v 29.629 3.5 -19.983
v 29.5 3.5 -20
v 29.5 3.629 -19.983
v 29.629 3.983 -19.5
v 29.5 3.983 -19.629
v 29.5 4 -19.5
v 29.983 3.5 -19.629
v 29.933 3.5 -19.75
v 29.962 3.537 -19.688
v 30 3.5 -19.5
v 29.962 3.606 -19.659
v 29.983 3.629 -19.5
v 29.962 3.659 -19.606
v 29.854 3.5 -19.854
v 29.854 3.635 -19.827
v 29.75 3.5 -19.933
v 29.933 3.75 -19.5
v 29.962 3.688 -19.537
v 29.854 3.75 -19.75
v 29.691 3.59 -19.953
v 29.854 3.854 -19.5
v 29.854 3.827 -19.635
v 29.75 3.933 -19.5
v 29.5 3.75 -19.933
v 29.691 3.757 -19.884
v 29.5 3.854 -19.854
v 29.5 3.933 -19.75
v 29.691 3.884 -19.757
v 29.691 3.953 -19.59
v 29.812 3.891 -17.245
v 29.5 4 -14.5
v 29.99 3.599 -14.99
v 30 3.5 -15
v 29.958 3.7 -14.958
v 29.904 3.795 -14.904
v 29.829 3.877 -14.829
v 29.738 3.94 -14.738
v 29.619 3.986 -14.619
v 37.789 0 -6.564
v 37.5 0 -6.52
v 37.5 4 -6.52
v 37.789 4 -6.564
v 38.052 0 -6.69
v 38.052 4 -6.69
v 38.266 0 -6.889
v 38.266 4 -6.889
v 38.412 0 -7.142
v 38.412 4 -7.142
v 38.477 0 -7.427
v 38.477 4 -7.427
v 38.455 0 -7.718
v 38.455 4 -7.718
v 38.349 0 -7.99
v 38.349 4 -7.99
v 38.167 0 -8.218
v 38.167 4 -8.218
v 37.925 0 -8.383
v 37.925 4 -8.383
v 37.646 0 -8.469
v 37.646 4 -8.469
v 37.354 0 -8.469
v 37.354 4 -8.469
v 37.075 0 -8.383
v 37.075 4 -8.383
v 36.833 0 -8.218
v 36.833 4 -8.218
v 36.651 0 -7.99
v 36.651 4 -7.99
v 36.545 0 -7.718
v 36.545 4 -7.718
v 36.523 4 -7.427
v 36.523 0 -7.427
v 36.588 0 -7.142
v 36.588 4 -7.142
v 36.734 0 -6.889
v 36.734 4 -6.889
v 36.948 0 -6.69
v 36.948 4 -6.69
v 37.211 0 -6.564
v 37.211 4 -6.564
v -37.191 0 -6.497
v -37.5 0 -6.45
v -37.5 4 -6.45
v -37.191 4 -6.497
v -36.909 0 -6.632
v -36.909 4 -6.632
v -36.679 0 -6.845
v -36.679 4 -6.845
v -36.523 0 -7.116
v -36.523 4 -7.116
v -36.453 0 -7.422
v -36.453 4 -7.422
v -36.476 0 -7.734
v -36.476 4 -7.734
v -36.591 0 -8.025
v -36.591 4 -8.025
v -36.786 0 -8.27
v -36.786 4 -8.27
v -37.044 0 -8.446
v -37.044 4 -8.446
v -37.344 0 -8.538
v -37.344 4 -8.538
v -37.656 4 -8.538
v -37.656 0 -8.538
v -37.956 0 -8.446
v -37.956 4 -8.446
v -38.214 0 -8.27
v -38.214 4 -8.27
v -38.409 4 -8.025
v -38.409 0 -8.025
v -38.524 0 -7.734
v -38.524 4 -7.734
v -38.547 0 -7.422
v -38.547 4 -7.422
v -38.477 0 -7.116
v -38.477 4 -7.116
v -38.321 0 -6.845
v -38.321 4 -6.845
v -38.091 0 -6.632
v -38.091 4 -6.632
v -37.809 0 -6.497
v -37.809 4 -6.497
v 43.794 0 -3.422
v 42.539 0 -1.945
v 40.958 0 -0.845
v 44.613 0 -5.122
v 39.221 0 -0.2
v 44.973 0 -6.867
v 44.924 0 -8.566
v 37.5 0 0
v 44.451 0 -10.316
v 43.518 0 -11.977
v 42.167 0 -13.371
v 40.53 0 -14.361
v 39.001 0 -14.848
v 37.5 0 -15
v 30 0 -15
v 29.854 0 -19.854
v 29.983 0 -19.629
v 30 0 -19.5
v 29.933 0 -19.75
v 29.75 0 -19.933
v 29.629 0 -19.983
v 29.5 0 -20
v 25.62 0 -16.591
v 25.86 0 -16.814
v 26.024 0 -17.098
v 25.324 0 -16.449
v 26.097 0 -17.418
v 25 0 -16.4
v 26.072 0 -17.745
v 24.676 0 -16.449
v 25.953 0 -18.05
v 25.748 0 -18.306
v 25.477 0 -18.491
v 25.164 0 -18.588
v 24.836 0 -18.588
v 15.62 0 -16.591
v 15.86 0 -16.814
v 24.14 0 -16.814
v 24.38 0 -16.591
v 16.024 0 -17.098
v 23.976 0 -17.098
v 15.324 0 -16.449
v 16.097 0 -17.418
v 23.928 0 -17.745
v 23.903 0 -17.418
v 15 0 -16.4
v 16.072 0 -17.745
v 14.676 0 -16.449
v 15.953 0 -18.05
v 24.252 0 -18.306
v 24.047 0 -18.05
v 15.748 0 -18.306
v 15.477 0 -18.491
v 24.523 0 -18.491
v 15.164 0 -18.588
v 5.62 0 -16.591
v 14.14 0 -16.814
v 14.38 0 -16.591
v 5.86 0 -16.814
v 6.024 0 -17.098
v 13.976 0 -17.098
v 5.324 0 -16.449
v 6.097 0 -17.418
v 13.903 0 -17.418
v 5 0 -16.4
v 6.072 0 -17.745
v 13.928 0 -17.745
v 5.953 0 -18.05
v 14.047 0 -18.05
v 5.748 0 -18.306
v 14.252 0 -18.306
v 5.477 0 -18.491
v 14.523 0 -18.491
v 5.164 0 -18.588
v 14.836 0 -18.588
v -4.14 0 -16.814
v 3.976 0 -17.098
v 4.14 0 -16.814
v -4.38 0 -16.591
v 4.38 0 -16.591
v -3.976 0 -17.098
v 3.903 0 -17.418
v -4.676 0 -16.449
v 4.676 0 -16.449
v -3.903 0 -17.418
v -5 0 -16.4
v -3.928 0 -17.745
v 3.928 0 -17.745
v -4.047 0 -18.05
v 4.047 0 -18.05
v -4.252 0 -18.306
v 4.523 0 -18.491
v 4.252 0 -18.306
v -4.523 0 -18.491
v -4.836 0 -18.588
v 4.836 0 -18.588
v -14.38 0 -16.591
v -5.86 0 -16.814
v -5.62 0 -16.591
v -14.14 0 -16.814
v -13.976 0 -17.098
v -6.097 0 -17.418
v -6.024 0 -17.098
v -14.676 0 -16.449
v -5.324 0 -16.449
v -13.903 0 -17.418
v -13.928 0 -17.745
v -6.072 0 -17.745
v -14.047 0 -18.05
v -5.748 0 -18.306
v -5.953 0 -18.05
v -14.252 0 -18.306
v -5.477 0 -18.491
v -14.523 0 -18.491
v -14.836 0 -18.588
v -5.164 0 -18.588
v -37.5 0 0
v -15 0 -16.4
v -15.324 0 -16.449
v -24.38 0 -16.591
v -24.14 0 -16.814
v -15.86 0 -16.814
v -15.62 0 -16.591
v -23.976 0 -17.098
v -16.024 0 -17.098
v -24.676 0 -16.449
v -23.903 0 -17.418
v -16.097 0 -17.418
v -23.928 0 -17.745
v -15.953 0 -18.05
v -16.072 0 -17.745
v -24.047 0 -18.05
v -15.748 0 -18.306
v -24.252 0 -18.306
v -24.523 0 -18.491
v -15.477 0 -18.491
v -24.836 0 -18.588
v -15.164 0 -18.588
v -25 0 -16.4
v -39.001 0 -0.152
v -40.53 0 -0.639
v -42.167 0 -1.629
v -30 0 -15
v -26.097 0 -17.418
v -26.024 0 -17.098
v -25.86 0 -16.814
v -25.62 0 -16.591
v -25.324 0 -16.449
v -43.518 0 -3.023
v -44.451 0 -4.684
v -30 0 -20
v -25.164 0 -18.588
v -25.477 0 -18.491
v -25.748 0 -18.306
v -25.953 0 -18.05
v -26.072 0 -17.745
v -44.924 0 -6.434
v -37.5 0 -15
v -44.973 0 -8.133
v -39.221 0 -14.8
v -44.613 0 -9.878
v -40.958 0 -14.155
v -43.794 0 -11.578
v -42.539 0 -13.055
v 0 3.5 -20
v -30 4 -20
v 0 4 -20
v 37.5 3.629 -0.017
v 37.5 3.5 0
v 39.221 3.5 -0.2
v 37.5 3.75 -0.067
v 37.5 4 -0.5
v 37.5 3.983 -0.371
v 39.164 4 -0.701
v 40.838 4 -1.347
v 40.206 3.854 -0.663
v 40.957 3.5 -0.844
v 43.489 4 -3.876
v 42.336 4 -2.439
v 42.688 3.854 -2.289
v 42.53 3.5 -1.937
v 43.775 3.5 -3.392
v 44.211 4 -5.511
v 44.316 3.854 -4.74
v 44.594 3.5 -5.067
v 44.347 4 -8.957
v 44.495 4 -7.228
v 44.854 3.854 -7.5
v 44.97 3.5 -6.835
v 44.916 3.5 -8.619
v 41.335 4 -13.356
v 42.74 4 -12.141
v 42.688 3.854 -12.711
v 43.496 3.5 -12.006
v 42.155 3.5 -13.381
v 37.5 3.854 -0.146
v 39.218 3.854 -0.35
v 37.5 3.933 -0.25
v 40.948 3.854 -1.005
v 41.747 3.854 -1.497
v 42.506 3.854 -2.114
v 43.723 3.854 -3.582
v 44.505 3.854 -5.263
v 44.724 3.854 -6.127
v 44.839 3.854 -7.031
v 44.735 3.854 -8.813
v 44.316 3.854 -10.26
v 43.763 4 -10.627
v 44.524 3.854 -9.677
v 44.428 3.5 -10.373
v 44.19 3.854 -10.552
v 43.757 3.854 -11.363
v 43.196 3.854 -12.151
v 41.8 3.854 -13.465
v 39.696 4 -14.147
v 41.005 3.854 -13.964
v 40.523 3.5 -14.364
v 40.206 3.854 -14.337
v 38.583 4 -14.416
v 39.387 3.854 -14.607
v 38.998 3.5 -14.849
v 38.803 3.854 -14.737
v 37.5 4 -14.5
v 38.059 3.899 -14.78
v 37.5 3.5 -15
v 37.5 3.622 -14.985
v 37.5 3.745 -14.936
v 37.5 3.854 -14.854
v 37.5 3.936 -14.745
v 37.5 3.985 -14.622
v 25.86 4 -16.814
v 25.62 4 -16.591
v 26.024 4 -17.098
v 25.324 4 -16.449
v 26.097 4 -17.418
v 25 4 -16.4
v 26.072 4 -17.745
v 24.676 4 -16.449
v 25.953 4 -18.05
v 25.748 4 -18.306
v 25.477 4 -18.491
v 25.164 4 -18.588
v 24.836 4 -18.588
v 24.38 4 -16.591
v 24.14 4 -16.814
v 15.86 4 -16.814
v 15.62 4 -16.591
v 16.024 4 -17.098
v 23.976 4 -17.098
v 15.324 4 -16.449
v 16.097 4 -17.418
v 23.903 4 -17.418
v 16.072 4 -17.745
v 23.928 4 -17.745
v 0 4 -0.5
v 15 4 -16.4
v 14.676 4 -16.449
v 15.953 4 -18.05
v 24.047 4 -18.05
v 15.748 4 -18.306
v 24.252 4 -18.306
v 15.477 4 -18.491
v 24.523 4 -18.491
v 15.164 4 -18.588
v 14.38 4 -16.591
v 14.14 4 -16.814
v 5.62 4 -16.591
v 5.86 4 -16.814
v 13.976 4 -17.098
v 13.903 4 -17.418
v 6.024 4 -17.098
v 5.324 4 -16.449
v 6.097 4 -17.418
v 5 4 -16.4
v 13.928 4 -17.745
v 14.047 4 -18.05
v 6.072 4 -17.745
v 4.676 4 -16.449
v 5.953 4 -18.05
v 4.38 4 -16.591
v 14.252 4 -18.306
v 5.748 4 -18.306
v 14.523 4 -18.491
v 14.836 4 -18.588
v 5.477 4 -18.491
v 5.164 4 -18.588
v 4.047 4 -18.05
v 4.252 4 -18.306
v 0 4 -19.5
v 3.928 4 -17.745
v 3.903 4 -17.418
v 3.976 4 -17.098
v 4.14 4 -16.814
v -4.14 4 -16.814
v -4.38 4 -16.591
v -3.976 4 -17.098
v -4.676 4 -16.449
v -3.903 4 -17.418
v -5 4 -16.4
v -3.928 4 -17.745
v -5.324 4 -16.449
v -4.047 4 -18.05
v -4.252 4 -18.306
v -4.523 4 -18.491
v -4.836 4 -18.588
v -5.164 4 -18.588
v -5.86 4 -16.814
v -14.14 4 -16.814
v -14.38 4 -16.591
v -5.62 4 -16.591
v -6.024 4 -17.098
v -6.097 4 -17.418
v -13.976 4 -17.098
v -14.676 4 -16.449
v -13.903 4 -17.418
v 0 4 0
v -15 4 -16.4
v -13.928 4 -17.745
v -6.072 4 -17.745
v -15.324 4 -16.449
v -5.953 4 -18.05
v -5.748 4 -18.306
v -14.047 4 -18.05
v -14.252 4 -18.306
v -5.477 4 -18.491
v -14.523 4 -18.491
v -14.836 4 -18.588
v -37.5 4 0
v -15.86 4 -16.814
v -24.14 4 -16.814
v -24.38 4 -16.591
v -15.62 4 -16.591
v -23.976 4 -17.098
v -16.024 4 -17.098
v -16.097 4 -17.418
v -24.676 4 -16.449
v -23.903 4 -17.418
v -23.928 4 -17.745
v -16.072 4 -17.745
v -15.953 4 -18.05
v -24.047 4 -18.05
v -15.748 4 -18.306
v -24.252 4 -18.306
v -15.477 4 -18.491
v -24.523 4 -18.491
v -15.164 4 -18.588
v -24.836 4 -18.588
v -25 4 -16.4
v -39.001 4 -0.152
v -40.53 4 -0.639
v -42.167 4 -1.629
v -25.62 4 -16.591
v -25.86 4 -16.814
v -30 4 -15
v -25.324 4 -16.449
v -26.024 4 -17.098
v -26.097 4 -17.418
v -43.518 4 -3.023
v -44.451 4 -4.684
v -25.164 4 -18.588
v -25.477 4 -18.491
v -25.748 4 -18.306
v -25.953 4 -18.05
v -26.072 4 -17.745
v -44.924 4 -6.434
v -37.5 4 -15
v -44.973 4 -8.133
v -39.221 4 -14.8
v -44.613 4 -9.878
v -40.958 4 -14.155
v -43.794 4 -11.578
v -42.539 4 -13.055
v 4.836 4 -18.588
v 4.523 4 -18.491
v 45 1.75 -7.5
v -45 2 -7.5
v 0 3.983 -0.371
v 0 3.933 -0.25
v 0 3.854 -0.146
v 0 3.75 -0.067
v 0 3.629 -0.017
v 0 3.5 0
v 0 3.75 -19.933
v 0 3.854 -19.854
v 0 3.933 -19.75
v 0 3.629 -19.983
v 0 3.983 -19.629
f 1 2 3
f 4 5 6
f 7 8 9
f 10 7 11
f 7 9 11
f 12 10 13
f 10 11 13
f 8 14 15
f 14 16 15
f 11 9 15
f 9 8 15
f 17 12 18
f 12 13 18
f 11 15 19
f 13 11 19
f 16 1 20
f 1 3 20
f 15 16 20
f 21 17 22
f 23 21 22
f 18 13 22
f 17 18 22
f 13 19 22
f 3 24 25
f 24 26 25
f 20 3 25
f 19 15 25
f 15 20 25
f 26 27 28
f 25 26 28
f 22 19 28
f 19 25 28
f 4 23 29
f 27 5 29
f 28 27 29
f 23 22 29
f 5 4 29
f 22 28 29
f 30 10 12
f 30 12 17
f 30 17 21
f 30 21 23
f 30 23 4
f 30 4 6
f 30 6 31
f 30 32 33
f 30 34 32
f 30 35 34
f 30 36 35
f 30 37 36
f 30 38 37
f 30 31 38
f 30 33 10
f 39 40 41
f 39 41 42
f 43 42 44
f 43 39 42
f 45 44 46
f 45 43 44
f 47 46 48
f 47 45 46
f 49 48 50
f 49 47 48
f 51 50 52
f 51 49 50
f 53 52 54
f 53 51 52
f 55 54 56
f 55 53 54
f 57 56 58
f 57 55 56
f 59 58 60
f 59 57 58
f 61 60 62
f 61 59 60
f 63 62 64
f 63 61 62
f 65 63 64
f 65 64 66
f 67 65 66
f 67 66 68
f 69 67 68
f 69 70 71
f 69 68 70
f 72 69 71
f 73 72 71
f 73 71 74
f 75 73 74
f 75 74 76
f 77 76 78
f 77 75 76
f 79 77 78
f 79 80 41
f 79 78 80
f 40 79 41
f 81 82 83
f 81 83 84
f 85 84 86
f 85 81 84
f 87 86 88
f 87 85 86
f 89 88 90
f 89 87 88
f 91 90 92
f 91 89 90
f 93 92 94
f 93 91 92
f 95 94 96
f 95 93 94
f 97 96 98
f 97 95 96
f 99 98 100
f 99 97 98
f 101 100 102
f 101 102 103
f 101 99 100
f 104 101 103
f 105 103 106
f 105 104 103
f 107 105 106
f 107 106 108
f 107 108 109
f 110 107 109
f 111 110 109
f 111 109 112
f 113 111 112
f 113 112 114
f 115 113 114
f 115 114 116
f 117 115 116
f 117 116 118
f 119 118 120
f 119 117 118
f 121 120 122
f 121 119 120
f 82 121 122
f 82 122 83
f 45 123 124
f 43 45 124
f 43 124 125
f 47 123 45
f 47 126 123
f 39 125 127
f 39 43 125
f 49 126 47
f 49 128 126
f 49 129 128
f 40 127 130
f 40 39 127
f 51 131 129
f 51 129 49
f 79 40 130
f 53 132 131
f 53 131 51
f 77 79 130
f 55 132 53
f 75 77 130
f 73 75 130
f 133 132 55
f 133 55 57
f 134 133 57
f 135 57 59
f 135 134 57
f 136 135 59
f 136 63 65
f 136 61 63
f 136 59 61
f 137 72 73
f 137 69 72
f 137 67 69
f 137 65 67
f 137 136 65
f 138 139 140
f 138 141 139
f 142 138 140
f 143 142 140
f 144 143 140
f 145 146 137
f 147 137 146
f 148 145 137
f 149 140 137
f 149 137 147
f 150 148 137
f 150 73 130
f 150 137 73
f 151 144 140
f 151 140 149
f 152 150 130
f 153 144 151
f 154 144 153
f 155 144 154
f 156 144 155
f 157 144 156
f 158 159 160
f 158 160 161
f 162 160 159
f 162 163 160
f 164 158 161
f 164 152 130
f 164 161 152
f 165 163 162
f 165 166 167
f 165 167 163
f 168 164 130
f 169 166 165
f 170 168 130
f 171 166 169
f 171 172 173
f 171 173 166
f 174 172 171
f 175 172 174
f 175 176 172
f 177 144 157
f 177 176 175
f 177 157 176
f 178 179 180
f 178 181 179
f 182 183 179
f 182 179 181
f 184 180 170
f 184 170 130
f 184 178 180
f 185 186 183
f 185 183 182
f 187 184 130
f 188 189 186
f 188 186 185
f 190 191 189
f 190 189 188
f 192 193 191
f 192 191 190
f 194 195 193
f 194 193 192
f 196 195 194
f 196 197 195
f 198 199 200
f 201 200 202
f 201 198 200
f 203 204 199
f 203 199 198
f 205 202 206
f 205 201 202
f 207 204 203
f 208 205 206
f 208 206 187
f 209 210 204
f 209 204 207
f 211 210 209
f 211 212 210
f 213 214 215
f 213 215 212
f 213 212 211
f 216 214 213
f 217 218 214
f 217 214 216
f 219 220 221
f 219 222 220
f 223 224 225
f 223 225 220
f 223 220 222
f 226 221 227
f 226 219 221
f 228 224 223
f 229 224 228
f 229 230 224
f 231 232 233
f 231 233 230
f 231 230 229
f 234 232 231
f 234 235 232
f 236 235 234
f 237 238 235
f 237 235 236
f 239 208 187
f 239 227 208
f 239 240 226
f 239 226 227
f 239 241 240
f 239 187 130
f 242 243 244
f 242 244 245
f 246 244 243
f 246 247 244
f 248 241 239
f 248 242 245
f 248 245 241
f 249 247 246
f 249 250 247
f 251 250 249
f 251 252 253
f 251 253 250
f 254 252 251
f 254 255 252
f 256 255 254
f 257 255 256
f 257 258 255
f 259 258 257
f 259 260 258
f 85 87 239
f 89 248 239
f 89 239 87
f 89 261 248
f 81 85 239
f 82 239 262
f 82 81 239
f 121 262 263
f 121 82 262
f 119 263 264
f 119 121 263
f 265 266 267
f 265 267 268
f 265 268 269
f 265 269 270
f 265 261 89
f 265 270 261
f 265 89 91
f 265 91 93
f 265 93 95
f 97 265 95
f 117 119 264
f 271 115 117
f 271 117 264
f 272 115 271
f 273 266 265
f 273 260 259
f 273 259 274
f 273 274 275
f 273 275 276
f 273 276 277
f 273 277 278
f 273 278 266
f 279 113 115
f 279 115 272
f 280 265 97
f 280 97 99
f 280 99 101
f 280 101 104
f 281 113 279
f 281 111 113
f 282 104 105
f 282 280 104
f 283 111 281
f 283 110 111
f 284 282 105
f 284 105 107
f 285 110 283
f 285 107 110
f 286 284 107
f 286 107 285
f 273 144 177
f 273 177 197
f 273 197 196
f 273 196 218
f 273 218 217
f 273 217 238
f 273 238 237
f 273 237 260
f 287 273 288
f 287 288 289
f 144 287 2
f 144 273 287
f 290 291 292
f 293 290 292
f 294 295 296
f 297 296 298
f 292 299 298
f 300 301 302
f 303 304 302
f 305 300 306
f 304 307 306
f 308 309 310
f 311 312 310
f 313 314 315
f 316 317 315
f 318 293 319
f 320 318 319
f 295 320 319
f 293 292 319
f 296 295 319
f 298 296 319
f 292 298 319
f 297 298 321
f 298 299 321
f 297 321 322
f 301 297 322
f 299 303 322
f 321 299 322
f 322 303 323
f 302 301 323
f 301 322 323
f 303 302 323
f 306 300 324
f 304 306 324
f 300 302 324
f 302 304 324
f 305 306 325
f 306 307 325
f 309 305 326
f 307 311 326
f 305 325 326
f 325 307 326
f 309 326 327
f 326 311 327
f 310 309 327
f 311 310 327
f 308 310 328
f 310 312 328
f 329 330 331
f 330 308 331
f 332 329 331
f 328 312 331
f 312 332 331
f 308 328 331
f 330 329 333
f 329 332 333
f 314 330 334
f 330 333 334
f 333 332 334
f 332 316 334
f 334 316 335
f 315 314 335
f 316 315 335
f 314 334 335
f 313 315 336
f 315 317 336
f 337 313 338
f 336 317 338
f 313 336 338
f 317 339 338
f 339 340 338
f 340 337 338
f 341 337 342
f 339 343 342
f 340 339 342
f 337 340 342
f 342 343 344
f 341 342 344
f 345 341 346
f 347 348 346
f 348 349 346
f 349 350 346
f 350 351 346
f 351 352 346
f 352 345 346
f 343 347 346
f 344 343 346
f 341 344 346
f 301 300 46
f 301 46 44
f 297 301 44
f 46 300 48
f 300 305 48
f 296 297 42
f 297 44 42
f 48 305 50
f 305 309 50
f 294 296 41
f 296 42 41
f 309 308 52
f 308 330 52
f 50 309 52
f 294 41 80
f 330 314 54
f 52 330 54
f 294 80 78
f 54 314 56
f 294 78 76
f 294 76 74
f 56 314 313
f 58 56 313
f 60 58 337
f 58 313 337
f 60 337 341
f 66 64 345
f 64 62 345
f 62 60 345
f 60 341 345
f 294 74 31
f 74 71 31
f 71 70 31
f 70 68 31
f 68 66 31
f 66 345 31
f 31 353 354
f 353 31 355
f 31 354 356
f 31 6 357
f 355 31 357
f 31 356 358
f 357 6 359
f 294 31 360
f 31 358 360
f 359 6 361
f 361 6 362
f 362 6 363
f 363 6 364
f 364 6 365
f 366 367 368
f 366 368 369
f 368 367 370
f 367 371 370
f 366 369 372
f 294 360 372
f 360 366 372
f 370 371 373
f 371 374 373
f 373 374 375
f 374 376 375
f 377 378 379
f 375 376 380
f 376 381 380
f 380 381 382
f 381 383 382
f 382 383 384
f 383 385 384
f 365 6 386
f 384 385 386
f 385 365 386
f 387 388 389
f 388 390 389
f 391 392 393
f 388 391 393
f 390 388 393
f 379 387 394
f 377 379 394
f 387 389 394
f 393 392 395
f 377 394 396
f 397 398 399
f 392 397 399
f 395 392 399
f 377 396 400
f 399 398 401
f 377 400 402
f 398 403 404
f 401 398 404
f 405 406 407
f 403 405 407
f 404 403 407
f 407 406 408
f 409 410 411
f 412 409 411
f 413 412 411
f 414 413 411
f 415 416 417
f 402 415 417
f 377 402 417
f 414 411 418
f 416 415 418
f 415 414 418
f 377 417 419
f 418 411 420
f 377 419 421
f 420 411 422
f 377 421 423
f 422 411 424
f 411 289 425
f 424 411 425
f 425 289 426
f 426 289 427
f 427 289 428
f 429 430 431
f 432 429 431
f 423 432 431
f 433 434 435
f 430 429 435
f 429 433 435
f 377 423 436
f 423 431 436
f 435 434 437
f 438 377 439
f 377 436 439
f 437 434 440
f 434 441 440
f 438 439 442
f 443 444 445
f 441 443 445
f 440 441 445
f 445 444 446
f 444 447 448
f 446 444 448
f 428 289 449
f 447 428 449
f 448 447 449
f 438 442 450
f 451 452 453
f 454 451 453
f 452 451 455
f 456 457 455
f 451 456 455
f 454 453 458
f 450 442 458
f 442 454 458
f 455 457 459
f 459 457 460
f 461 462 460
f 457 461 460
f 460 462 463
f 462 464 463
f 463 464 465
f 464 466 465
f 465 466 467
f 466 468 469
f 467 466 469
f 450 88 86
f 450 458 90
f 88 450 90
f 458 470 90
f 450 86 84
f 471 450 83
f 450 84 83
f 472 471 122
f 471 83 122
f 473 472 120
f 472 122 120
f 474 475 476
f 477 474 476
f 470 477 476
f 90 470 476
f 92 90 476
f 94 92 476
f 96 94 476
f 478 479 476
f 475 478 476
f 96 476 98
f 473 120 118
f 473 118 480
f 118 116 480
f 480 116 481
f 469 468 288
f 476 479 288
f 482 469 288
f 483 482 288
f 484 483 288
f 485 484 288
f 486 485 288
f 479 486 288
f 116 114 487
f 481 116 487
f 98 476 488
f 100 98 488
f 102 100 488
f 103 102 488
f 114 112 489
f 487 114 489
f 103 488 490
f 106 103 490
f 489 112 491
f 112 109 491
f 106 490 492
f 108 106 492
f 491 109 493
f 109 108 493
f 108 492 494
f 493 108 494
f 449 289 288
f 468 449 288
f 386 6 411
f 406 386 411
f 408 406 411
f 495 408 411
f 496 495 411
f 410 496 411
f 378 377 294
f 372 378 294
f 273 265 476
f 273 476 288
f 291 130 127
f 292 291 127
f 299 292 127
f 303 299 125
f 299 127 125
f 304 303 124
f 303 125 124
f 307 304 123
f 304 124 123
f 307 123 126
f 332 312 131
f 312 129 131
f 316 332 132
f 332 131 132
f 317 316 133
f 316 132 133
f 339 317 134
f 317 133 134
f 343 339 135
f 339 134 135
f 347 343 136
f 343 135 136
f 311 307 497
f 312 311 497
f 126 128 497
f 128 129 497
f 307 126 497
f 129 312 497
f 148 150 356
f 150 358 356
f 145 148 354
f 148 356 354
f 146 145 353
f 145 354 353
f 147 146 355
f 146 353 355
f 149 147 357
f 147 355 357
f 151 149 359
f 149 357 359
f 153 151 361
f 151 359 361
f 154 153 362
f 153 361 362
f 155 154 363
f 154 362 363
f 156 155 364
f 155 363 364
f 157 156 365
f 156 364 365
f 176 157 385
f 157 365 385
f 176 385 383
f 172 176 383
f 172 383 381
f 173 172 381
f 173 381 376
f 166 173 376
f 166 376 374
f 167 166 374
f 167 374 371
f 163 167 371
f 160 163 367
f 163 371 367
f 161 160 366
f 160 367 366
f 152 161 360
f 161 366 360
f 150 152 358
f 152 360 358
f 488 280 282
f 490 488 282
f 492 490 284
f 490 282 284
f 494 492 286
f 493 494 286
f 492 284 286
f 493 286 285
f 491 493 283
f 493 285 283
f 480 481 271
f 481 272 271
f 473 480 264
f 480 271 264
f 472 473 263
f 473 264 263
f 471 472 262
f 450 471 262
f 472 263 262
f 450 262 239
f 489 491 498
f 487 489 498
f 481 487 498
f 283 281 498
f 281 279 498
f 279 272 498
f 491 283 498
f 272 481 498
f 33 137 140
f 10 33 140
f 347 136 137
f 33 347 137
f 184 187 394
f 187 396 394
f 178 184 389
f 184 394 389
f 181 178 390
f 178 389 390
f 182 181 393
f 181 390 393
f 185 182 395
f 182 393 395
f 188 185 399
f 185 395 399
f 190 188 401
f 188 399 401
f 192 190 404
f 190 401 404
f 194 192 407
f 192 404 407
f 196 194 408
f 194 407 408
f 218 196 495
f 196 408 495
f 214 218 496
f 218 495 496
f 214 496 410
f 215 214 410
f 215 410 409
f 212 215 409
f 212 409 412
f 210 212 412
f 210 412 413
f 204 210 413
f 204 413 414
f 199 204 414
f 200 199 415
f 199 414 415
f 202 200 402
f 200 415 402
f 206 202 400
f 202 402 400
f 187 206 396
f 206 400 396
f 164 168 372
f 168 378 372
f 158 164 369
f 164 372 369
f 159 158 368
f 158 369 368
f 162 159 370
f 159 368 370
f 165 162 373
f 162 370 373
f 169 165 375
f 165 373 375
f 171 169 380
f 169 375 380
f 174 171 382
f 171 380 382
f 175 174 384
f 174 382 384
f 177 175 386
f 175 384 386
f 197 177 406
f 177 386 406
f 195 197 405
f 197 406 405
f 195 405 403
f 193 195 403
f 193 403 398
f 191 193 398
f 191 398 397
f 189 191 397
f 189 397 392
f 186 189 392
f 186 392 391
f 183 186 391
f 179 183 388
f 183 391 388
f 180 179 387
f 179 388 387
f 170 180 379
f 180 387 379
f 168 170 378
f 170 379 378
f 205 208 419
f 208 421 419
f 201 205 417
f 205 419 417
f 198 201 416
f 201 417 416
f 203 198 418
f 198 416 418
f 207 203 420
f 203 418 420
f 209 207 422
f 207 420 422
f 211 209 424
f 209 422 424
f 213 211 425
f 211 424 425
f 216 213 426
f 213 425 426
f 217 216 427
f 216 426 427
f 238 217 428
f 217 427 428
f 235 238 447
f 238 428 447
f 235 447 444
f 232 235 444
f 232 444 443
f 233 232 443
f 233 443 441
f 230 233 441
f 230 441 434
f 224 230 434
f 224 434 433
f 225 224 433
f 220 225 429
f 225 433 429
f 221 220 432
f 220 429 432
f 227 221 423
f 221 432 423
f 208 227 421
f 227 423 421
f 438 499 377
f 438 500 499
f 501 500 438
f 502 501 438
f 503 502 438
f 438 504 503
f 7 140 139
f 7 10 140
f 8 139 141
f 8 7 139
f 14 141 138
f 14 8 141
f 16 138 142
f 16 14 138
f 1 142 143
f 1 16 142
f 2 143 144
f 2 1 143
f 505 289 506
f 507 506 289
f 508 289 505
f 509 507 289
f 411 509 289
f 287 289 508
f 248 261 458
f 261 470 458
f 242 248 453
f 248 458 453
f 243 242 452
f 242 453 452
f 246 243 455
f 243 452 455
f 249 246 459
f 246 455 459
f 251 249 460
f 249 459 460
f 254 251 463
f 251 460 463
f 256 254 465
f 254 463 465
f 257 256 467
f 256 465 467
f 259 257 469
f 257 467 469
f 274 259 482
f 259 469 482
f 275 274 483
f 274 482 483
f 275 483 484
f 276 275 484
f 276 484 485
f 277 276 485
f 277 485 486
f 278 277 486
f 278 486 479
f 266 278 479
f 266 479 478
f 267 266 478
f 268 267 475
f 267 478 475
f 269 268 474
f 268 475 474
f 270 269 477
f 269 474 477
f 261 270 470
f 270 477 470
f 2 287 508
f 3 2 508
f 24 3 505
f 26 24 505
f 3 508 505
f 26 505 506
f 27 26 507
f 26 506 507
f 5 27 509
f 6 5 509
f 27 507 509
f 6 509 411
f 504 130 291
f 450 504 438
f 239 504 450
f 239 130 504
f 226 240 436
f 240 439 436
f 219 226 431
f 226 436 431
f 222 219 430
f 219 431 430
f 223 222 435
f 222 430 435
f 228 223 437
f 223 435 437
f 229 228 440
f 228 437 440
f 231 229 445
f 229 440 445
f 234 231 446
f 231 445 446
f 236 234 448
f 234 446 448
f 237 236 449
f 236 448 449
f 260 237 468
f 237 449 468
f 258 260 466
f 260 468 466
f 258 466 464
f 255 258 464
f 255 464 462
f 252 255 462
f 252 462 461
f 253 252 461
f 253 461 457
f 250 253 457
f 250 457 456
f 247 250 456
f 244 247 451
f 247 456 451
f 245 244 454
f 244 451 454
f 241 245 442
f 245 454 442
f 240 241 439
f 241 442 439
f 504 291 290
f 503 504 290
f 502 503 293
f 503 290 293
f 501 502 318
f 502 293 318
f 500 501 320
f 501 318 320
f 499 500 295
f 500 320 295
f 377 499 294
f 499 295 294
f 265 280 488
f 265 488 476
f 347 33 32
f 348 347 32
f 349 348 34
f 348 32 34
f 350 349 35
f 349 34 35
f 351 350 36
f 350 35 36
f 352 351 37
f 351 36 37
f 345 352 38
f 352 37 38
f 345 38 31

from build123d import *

# Parameters (mm, degrees)
BOSS_EXTRUDE1_DEPTH     = 4
SKETCH3_R               = 1.1
CUT_EXTRUDE2_DEPTH      = 50.406477448
CUT_EXTRUDE3_DEPTH      = 50.406477448
CUT_EXTRUDE3_DEPTH_BACK = 50.406477448
SKETCH4_R               = 0.99
SKETCH4_R_2             = 0.98
FILLET1_R               = 0.5
FILLET2_R               = 0.5
FILLET4_R               = 0.5
SKETCH5_W               = 16.044990583
SKETCH5_H               = 15
CUT_EXTRUDE4_DEPTH      = 10
SKETCH6_R               = 1.05
BOSS_EXTRUDE2_DEPTH     = 4
LPATTERN3_COUNT         = 5
LPATTERN3_PITCH         = 10
LPATTERN3_COUNT_DIR2    = 5
LPATTERN3_PITCH_DIR2    = 10


with BuildPart() as part:
    # Sketch2 → Boss-Extrude1 (new body)
    with BuildSketch(Plane(origin=(0, 0, 0), x_dir=(1, 0, 0), z_dir=(0, 1, 0))):
        with BuildLine():
            Line((-7.5, 0), (0, 0))
            Line((0, 0), (30, 0))
            Line((30, 0), (37.5, 0))
            add(Edge.make_bspline(
                [(37.5, 0), (45, 0), (45, 7.5), (45, 15), (37.5, 15)],
                knots=[0, 0, 0, 1.570796327, 1.570796327, 3.141592654, 3.141592654, 3.141592654], degree=2, weights=[1, 0.707106781, 1, 0.707106781, 1]))
            Line((37.5, 15), (30, 15))
            Line((30, 15), (30, 20))
            Line((30, 20), (0, 20))
            Line((0, 20), (0, 15))
            Line((0, 15), (-7.5, 15))
            add(Edge.make_bspline(
                [(-7.5, 15), (-15, 15), (-15, 7.5), (-15, 0), (-7.5, 0)],
                knots=[1.570796327, 1.570796327, 1.570796327, 3.141592654, 3.141592654, 4.71238898, 4.71238898, 4.71238898], degree=2, weights=[1, 0.707106781, 1, 0.707106781, 1]))
        make_face()
    extrude(amount=BOSS_EXTRUDE1_DEPTH)

    # Sketch3 → Cut-Extrude2 (cut, symmetric)
    with BuildSketch(Plane(origin=(0, 0, 0), x_dir=(1, 0, 0), z_dir=(0, 1, 0))):
        with Locations(Location((15, 17.5, 0), (0, 0, 270))):
            Circle(SKETCH3_R)
    cut_extrude2 = extrude(amount=CUT_EXTRUDE2_DEPTH, both=True, mode=Mode.SUBTRACT)

    # Sketch4 → Cut-Extrude3 (cut, two sides: drawn at the far end of the back side and taken through both)
    with BuildSketch(Plane(origin=(0, 0, 0), x_dir=(1, 0, 0), z_dir=(0, 1, 0)).offset(-CUT_EXTRUDE3_DEPTH_BACK)):
        with Locations(Location((-7.5, 7.5, 0), (0, 0, 270))):
            Circle(SKETCH4_R)
        with Locations(Location((37.5, 7.5, 0), (0, 0, 270))):
            Circle(SKETCH4_R_2)
    extrude(amount=CUT_EXTRUDE3_DEPTH + CUT_EXTRUDE3_DEPTH_BACK, mode=Mode.SUBTRACT)

    # Fillet1
    fillet1_edges = [part.edges().sort_by_distance(p)[0] for p in [
        (45, 4, -7.5),
        (33.75, 4, -15),
        (-3.75, 4, -15),
        (-15, 4, -7.5),
        (15, 4, 0),
    ]]
    fillet(fillet1_edges, radius=FILLET1_R)

    # Fillet2
    fillet2_edges = [part.edges().sort_by_distance(p)[0] for p in [
        (15, 4, -20),
    ]]
    fillet(fillet2_edges, radius=FILLET2_R)

    # Fillet4
    fillet4_edges = [part.edges().sort_by_distance(p)[0] for p in [
        (30, 1.75, -20),
        (30, 3.853553391, -19.853553391),
        (30, 4, -17),
    ]]
    fillet(fillet4_edges, radius=FILLET4_R)

    # Sketch5 → Cut-Extrude4 (cut)
    with BuildSketch(Plane(origin=(0, 0, 0), x_dir=(1, 0, 0), z_dir=(0, 1, 0))):
        with Locations((-8.022495292, 7.5)):
            Rectangle(SKETCH5_W, SKETCH5_H)
    extrude(amount=CUT_EXTRUDE4_DEPTH, mode=Mode.SUBTRACT)

    # Sketch6 → Boss-Extrude2 (add)
    with BuildSketch(Plane(origin=(0, 0, 0), x_dir=(1, 0, 0), z_dir=(0, 1, 0))):
        with BuildLine():
            Line((0, 0), (-37.5, 0))
            add(Edge.make_bspline(
                [(-37.5, 15), (-45, 15), (-45, 7.5), (-45, 0), (-37.5, 0)],
                knots=[3.141592654, 3.141592654, 3.141592654, 4.71238898, 4.71238898, 6.283185307, 6.283185307, 6.283185307], degree=2, weights=[1, 0.707106781, 1, 0.707106781, 1]))
            Line((-37.5, 15), (-30, 15))
            Line((-30, 15), (-30, 20))
            Line((-30, 20), (0, 20))
            Line((0, 20), (0, 0))
        make_face()
        with Locations(Location((-37.5, 7.5, 0), (0, 0, 270))):
            Circle(SKETCH6_R, mode=Mode.SUBTRACT)
    extrude(amount=BOSS_EXTRUDE2_DEPTH)

    # LPattern3: Cut-Extrude2 5 × 5
    with Locations(*[Vector(-1, 0, 0) * (i * LPATTERN3_PITCH) + Vector(1, 0, 0) * (j * LPATTERN3_PITCH_DIR2) for i in range(LPATTERN3_COUNT) for j in range(LPATTERN3_COUNT_DIR2) if (i, j) != (0, 0)]):
        add(cut_extrude2, mode=Mode.SUBTRACT)


solid = part.part
